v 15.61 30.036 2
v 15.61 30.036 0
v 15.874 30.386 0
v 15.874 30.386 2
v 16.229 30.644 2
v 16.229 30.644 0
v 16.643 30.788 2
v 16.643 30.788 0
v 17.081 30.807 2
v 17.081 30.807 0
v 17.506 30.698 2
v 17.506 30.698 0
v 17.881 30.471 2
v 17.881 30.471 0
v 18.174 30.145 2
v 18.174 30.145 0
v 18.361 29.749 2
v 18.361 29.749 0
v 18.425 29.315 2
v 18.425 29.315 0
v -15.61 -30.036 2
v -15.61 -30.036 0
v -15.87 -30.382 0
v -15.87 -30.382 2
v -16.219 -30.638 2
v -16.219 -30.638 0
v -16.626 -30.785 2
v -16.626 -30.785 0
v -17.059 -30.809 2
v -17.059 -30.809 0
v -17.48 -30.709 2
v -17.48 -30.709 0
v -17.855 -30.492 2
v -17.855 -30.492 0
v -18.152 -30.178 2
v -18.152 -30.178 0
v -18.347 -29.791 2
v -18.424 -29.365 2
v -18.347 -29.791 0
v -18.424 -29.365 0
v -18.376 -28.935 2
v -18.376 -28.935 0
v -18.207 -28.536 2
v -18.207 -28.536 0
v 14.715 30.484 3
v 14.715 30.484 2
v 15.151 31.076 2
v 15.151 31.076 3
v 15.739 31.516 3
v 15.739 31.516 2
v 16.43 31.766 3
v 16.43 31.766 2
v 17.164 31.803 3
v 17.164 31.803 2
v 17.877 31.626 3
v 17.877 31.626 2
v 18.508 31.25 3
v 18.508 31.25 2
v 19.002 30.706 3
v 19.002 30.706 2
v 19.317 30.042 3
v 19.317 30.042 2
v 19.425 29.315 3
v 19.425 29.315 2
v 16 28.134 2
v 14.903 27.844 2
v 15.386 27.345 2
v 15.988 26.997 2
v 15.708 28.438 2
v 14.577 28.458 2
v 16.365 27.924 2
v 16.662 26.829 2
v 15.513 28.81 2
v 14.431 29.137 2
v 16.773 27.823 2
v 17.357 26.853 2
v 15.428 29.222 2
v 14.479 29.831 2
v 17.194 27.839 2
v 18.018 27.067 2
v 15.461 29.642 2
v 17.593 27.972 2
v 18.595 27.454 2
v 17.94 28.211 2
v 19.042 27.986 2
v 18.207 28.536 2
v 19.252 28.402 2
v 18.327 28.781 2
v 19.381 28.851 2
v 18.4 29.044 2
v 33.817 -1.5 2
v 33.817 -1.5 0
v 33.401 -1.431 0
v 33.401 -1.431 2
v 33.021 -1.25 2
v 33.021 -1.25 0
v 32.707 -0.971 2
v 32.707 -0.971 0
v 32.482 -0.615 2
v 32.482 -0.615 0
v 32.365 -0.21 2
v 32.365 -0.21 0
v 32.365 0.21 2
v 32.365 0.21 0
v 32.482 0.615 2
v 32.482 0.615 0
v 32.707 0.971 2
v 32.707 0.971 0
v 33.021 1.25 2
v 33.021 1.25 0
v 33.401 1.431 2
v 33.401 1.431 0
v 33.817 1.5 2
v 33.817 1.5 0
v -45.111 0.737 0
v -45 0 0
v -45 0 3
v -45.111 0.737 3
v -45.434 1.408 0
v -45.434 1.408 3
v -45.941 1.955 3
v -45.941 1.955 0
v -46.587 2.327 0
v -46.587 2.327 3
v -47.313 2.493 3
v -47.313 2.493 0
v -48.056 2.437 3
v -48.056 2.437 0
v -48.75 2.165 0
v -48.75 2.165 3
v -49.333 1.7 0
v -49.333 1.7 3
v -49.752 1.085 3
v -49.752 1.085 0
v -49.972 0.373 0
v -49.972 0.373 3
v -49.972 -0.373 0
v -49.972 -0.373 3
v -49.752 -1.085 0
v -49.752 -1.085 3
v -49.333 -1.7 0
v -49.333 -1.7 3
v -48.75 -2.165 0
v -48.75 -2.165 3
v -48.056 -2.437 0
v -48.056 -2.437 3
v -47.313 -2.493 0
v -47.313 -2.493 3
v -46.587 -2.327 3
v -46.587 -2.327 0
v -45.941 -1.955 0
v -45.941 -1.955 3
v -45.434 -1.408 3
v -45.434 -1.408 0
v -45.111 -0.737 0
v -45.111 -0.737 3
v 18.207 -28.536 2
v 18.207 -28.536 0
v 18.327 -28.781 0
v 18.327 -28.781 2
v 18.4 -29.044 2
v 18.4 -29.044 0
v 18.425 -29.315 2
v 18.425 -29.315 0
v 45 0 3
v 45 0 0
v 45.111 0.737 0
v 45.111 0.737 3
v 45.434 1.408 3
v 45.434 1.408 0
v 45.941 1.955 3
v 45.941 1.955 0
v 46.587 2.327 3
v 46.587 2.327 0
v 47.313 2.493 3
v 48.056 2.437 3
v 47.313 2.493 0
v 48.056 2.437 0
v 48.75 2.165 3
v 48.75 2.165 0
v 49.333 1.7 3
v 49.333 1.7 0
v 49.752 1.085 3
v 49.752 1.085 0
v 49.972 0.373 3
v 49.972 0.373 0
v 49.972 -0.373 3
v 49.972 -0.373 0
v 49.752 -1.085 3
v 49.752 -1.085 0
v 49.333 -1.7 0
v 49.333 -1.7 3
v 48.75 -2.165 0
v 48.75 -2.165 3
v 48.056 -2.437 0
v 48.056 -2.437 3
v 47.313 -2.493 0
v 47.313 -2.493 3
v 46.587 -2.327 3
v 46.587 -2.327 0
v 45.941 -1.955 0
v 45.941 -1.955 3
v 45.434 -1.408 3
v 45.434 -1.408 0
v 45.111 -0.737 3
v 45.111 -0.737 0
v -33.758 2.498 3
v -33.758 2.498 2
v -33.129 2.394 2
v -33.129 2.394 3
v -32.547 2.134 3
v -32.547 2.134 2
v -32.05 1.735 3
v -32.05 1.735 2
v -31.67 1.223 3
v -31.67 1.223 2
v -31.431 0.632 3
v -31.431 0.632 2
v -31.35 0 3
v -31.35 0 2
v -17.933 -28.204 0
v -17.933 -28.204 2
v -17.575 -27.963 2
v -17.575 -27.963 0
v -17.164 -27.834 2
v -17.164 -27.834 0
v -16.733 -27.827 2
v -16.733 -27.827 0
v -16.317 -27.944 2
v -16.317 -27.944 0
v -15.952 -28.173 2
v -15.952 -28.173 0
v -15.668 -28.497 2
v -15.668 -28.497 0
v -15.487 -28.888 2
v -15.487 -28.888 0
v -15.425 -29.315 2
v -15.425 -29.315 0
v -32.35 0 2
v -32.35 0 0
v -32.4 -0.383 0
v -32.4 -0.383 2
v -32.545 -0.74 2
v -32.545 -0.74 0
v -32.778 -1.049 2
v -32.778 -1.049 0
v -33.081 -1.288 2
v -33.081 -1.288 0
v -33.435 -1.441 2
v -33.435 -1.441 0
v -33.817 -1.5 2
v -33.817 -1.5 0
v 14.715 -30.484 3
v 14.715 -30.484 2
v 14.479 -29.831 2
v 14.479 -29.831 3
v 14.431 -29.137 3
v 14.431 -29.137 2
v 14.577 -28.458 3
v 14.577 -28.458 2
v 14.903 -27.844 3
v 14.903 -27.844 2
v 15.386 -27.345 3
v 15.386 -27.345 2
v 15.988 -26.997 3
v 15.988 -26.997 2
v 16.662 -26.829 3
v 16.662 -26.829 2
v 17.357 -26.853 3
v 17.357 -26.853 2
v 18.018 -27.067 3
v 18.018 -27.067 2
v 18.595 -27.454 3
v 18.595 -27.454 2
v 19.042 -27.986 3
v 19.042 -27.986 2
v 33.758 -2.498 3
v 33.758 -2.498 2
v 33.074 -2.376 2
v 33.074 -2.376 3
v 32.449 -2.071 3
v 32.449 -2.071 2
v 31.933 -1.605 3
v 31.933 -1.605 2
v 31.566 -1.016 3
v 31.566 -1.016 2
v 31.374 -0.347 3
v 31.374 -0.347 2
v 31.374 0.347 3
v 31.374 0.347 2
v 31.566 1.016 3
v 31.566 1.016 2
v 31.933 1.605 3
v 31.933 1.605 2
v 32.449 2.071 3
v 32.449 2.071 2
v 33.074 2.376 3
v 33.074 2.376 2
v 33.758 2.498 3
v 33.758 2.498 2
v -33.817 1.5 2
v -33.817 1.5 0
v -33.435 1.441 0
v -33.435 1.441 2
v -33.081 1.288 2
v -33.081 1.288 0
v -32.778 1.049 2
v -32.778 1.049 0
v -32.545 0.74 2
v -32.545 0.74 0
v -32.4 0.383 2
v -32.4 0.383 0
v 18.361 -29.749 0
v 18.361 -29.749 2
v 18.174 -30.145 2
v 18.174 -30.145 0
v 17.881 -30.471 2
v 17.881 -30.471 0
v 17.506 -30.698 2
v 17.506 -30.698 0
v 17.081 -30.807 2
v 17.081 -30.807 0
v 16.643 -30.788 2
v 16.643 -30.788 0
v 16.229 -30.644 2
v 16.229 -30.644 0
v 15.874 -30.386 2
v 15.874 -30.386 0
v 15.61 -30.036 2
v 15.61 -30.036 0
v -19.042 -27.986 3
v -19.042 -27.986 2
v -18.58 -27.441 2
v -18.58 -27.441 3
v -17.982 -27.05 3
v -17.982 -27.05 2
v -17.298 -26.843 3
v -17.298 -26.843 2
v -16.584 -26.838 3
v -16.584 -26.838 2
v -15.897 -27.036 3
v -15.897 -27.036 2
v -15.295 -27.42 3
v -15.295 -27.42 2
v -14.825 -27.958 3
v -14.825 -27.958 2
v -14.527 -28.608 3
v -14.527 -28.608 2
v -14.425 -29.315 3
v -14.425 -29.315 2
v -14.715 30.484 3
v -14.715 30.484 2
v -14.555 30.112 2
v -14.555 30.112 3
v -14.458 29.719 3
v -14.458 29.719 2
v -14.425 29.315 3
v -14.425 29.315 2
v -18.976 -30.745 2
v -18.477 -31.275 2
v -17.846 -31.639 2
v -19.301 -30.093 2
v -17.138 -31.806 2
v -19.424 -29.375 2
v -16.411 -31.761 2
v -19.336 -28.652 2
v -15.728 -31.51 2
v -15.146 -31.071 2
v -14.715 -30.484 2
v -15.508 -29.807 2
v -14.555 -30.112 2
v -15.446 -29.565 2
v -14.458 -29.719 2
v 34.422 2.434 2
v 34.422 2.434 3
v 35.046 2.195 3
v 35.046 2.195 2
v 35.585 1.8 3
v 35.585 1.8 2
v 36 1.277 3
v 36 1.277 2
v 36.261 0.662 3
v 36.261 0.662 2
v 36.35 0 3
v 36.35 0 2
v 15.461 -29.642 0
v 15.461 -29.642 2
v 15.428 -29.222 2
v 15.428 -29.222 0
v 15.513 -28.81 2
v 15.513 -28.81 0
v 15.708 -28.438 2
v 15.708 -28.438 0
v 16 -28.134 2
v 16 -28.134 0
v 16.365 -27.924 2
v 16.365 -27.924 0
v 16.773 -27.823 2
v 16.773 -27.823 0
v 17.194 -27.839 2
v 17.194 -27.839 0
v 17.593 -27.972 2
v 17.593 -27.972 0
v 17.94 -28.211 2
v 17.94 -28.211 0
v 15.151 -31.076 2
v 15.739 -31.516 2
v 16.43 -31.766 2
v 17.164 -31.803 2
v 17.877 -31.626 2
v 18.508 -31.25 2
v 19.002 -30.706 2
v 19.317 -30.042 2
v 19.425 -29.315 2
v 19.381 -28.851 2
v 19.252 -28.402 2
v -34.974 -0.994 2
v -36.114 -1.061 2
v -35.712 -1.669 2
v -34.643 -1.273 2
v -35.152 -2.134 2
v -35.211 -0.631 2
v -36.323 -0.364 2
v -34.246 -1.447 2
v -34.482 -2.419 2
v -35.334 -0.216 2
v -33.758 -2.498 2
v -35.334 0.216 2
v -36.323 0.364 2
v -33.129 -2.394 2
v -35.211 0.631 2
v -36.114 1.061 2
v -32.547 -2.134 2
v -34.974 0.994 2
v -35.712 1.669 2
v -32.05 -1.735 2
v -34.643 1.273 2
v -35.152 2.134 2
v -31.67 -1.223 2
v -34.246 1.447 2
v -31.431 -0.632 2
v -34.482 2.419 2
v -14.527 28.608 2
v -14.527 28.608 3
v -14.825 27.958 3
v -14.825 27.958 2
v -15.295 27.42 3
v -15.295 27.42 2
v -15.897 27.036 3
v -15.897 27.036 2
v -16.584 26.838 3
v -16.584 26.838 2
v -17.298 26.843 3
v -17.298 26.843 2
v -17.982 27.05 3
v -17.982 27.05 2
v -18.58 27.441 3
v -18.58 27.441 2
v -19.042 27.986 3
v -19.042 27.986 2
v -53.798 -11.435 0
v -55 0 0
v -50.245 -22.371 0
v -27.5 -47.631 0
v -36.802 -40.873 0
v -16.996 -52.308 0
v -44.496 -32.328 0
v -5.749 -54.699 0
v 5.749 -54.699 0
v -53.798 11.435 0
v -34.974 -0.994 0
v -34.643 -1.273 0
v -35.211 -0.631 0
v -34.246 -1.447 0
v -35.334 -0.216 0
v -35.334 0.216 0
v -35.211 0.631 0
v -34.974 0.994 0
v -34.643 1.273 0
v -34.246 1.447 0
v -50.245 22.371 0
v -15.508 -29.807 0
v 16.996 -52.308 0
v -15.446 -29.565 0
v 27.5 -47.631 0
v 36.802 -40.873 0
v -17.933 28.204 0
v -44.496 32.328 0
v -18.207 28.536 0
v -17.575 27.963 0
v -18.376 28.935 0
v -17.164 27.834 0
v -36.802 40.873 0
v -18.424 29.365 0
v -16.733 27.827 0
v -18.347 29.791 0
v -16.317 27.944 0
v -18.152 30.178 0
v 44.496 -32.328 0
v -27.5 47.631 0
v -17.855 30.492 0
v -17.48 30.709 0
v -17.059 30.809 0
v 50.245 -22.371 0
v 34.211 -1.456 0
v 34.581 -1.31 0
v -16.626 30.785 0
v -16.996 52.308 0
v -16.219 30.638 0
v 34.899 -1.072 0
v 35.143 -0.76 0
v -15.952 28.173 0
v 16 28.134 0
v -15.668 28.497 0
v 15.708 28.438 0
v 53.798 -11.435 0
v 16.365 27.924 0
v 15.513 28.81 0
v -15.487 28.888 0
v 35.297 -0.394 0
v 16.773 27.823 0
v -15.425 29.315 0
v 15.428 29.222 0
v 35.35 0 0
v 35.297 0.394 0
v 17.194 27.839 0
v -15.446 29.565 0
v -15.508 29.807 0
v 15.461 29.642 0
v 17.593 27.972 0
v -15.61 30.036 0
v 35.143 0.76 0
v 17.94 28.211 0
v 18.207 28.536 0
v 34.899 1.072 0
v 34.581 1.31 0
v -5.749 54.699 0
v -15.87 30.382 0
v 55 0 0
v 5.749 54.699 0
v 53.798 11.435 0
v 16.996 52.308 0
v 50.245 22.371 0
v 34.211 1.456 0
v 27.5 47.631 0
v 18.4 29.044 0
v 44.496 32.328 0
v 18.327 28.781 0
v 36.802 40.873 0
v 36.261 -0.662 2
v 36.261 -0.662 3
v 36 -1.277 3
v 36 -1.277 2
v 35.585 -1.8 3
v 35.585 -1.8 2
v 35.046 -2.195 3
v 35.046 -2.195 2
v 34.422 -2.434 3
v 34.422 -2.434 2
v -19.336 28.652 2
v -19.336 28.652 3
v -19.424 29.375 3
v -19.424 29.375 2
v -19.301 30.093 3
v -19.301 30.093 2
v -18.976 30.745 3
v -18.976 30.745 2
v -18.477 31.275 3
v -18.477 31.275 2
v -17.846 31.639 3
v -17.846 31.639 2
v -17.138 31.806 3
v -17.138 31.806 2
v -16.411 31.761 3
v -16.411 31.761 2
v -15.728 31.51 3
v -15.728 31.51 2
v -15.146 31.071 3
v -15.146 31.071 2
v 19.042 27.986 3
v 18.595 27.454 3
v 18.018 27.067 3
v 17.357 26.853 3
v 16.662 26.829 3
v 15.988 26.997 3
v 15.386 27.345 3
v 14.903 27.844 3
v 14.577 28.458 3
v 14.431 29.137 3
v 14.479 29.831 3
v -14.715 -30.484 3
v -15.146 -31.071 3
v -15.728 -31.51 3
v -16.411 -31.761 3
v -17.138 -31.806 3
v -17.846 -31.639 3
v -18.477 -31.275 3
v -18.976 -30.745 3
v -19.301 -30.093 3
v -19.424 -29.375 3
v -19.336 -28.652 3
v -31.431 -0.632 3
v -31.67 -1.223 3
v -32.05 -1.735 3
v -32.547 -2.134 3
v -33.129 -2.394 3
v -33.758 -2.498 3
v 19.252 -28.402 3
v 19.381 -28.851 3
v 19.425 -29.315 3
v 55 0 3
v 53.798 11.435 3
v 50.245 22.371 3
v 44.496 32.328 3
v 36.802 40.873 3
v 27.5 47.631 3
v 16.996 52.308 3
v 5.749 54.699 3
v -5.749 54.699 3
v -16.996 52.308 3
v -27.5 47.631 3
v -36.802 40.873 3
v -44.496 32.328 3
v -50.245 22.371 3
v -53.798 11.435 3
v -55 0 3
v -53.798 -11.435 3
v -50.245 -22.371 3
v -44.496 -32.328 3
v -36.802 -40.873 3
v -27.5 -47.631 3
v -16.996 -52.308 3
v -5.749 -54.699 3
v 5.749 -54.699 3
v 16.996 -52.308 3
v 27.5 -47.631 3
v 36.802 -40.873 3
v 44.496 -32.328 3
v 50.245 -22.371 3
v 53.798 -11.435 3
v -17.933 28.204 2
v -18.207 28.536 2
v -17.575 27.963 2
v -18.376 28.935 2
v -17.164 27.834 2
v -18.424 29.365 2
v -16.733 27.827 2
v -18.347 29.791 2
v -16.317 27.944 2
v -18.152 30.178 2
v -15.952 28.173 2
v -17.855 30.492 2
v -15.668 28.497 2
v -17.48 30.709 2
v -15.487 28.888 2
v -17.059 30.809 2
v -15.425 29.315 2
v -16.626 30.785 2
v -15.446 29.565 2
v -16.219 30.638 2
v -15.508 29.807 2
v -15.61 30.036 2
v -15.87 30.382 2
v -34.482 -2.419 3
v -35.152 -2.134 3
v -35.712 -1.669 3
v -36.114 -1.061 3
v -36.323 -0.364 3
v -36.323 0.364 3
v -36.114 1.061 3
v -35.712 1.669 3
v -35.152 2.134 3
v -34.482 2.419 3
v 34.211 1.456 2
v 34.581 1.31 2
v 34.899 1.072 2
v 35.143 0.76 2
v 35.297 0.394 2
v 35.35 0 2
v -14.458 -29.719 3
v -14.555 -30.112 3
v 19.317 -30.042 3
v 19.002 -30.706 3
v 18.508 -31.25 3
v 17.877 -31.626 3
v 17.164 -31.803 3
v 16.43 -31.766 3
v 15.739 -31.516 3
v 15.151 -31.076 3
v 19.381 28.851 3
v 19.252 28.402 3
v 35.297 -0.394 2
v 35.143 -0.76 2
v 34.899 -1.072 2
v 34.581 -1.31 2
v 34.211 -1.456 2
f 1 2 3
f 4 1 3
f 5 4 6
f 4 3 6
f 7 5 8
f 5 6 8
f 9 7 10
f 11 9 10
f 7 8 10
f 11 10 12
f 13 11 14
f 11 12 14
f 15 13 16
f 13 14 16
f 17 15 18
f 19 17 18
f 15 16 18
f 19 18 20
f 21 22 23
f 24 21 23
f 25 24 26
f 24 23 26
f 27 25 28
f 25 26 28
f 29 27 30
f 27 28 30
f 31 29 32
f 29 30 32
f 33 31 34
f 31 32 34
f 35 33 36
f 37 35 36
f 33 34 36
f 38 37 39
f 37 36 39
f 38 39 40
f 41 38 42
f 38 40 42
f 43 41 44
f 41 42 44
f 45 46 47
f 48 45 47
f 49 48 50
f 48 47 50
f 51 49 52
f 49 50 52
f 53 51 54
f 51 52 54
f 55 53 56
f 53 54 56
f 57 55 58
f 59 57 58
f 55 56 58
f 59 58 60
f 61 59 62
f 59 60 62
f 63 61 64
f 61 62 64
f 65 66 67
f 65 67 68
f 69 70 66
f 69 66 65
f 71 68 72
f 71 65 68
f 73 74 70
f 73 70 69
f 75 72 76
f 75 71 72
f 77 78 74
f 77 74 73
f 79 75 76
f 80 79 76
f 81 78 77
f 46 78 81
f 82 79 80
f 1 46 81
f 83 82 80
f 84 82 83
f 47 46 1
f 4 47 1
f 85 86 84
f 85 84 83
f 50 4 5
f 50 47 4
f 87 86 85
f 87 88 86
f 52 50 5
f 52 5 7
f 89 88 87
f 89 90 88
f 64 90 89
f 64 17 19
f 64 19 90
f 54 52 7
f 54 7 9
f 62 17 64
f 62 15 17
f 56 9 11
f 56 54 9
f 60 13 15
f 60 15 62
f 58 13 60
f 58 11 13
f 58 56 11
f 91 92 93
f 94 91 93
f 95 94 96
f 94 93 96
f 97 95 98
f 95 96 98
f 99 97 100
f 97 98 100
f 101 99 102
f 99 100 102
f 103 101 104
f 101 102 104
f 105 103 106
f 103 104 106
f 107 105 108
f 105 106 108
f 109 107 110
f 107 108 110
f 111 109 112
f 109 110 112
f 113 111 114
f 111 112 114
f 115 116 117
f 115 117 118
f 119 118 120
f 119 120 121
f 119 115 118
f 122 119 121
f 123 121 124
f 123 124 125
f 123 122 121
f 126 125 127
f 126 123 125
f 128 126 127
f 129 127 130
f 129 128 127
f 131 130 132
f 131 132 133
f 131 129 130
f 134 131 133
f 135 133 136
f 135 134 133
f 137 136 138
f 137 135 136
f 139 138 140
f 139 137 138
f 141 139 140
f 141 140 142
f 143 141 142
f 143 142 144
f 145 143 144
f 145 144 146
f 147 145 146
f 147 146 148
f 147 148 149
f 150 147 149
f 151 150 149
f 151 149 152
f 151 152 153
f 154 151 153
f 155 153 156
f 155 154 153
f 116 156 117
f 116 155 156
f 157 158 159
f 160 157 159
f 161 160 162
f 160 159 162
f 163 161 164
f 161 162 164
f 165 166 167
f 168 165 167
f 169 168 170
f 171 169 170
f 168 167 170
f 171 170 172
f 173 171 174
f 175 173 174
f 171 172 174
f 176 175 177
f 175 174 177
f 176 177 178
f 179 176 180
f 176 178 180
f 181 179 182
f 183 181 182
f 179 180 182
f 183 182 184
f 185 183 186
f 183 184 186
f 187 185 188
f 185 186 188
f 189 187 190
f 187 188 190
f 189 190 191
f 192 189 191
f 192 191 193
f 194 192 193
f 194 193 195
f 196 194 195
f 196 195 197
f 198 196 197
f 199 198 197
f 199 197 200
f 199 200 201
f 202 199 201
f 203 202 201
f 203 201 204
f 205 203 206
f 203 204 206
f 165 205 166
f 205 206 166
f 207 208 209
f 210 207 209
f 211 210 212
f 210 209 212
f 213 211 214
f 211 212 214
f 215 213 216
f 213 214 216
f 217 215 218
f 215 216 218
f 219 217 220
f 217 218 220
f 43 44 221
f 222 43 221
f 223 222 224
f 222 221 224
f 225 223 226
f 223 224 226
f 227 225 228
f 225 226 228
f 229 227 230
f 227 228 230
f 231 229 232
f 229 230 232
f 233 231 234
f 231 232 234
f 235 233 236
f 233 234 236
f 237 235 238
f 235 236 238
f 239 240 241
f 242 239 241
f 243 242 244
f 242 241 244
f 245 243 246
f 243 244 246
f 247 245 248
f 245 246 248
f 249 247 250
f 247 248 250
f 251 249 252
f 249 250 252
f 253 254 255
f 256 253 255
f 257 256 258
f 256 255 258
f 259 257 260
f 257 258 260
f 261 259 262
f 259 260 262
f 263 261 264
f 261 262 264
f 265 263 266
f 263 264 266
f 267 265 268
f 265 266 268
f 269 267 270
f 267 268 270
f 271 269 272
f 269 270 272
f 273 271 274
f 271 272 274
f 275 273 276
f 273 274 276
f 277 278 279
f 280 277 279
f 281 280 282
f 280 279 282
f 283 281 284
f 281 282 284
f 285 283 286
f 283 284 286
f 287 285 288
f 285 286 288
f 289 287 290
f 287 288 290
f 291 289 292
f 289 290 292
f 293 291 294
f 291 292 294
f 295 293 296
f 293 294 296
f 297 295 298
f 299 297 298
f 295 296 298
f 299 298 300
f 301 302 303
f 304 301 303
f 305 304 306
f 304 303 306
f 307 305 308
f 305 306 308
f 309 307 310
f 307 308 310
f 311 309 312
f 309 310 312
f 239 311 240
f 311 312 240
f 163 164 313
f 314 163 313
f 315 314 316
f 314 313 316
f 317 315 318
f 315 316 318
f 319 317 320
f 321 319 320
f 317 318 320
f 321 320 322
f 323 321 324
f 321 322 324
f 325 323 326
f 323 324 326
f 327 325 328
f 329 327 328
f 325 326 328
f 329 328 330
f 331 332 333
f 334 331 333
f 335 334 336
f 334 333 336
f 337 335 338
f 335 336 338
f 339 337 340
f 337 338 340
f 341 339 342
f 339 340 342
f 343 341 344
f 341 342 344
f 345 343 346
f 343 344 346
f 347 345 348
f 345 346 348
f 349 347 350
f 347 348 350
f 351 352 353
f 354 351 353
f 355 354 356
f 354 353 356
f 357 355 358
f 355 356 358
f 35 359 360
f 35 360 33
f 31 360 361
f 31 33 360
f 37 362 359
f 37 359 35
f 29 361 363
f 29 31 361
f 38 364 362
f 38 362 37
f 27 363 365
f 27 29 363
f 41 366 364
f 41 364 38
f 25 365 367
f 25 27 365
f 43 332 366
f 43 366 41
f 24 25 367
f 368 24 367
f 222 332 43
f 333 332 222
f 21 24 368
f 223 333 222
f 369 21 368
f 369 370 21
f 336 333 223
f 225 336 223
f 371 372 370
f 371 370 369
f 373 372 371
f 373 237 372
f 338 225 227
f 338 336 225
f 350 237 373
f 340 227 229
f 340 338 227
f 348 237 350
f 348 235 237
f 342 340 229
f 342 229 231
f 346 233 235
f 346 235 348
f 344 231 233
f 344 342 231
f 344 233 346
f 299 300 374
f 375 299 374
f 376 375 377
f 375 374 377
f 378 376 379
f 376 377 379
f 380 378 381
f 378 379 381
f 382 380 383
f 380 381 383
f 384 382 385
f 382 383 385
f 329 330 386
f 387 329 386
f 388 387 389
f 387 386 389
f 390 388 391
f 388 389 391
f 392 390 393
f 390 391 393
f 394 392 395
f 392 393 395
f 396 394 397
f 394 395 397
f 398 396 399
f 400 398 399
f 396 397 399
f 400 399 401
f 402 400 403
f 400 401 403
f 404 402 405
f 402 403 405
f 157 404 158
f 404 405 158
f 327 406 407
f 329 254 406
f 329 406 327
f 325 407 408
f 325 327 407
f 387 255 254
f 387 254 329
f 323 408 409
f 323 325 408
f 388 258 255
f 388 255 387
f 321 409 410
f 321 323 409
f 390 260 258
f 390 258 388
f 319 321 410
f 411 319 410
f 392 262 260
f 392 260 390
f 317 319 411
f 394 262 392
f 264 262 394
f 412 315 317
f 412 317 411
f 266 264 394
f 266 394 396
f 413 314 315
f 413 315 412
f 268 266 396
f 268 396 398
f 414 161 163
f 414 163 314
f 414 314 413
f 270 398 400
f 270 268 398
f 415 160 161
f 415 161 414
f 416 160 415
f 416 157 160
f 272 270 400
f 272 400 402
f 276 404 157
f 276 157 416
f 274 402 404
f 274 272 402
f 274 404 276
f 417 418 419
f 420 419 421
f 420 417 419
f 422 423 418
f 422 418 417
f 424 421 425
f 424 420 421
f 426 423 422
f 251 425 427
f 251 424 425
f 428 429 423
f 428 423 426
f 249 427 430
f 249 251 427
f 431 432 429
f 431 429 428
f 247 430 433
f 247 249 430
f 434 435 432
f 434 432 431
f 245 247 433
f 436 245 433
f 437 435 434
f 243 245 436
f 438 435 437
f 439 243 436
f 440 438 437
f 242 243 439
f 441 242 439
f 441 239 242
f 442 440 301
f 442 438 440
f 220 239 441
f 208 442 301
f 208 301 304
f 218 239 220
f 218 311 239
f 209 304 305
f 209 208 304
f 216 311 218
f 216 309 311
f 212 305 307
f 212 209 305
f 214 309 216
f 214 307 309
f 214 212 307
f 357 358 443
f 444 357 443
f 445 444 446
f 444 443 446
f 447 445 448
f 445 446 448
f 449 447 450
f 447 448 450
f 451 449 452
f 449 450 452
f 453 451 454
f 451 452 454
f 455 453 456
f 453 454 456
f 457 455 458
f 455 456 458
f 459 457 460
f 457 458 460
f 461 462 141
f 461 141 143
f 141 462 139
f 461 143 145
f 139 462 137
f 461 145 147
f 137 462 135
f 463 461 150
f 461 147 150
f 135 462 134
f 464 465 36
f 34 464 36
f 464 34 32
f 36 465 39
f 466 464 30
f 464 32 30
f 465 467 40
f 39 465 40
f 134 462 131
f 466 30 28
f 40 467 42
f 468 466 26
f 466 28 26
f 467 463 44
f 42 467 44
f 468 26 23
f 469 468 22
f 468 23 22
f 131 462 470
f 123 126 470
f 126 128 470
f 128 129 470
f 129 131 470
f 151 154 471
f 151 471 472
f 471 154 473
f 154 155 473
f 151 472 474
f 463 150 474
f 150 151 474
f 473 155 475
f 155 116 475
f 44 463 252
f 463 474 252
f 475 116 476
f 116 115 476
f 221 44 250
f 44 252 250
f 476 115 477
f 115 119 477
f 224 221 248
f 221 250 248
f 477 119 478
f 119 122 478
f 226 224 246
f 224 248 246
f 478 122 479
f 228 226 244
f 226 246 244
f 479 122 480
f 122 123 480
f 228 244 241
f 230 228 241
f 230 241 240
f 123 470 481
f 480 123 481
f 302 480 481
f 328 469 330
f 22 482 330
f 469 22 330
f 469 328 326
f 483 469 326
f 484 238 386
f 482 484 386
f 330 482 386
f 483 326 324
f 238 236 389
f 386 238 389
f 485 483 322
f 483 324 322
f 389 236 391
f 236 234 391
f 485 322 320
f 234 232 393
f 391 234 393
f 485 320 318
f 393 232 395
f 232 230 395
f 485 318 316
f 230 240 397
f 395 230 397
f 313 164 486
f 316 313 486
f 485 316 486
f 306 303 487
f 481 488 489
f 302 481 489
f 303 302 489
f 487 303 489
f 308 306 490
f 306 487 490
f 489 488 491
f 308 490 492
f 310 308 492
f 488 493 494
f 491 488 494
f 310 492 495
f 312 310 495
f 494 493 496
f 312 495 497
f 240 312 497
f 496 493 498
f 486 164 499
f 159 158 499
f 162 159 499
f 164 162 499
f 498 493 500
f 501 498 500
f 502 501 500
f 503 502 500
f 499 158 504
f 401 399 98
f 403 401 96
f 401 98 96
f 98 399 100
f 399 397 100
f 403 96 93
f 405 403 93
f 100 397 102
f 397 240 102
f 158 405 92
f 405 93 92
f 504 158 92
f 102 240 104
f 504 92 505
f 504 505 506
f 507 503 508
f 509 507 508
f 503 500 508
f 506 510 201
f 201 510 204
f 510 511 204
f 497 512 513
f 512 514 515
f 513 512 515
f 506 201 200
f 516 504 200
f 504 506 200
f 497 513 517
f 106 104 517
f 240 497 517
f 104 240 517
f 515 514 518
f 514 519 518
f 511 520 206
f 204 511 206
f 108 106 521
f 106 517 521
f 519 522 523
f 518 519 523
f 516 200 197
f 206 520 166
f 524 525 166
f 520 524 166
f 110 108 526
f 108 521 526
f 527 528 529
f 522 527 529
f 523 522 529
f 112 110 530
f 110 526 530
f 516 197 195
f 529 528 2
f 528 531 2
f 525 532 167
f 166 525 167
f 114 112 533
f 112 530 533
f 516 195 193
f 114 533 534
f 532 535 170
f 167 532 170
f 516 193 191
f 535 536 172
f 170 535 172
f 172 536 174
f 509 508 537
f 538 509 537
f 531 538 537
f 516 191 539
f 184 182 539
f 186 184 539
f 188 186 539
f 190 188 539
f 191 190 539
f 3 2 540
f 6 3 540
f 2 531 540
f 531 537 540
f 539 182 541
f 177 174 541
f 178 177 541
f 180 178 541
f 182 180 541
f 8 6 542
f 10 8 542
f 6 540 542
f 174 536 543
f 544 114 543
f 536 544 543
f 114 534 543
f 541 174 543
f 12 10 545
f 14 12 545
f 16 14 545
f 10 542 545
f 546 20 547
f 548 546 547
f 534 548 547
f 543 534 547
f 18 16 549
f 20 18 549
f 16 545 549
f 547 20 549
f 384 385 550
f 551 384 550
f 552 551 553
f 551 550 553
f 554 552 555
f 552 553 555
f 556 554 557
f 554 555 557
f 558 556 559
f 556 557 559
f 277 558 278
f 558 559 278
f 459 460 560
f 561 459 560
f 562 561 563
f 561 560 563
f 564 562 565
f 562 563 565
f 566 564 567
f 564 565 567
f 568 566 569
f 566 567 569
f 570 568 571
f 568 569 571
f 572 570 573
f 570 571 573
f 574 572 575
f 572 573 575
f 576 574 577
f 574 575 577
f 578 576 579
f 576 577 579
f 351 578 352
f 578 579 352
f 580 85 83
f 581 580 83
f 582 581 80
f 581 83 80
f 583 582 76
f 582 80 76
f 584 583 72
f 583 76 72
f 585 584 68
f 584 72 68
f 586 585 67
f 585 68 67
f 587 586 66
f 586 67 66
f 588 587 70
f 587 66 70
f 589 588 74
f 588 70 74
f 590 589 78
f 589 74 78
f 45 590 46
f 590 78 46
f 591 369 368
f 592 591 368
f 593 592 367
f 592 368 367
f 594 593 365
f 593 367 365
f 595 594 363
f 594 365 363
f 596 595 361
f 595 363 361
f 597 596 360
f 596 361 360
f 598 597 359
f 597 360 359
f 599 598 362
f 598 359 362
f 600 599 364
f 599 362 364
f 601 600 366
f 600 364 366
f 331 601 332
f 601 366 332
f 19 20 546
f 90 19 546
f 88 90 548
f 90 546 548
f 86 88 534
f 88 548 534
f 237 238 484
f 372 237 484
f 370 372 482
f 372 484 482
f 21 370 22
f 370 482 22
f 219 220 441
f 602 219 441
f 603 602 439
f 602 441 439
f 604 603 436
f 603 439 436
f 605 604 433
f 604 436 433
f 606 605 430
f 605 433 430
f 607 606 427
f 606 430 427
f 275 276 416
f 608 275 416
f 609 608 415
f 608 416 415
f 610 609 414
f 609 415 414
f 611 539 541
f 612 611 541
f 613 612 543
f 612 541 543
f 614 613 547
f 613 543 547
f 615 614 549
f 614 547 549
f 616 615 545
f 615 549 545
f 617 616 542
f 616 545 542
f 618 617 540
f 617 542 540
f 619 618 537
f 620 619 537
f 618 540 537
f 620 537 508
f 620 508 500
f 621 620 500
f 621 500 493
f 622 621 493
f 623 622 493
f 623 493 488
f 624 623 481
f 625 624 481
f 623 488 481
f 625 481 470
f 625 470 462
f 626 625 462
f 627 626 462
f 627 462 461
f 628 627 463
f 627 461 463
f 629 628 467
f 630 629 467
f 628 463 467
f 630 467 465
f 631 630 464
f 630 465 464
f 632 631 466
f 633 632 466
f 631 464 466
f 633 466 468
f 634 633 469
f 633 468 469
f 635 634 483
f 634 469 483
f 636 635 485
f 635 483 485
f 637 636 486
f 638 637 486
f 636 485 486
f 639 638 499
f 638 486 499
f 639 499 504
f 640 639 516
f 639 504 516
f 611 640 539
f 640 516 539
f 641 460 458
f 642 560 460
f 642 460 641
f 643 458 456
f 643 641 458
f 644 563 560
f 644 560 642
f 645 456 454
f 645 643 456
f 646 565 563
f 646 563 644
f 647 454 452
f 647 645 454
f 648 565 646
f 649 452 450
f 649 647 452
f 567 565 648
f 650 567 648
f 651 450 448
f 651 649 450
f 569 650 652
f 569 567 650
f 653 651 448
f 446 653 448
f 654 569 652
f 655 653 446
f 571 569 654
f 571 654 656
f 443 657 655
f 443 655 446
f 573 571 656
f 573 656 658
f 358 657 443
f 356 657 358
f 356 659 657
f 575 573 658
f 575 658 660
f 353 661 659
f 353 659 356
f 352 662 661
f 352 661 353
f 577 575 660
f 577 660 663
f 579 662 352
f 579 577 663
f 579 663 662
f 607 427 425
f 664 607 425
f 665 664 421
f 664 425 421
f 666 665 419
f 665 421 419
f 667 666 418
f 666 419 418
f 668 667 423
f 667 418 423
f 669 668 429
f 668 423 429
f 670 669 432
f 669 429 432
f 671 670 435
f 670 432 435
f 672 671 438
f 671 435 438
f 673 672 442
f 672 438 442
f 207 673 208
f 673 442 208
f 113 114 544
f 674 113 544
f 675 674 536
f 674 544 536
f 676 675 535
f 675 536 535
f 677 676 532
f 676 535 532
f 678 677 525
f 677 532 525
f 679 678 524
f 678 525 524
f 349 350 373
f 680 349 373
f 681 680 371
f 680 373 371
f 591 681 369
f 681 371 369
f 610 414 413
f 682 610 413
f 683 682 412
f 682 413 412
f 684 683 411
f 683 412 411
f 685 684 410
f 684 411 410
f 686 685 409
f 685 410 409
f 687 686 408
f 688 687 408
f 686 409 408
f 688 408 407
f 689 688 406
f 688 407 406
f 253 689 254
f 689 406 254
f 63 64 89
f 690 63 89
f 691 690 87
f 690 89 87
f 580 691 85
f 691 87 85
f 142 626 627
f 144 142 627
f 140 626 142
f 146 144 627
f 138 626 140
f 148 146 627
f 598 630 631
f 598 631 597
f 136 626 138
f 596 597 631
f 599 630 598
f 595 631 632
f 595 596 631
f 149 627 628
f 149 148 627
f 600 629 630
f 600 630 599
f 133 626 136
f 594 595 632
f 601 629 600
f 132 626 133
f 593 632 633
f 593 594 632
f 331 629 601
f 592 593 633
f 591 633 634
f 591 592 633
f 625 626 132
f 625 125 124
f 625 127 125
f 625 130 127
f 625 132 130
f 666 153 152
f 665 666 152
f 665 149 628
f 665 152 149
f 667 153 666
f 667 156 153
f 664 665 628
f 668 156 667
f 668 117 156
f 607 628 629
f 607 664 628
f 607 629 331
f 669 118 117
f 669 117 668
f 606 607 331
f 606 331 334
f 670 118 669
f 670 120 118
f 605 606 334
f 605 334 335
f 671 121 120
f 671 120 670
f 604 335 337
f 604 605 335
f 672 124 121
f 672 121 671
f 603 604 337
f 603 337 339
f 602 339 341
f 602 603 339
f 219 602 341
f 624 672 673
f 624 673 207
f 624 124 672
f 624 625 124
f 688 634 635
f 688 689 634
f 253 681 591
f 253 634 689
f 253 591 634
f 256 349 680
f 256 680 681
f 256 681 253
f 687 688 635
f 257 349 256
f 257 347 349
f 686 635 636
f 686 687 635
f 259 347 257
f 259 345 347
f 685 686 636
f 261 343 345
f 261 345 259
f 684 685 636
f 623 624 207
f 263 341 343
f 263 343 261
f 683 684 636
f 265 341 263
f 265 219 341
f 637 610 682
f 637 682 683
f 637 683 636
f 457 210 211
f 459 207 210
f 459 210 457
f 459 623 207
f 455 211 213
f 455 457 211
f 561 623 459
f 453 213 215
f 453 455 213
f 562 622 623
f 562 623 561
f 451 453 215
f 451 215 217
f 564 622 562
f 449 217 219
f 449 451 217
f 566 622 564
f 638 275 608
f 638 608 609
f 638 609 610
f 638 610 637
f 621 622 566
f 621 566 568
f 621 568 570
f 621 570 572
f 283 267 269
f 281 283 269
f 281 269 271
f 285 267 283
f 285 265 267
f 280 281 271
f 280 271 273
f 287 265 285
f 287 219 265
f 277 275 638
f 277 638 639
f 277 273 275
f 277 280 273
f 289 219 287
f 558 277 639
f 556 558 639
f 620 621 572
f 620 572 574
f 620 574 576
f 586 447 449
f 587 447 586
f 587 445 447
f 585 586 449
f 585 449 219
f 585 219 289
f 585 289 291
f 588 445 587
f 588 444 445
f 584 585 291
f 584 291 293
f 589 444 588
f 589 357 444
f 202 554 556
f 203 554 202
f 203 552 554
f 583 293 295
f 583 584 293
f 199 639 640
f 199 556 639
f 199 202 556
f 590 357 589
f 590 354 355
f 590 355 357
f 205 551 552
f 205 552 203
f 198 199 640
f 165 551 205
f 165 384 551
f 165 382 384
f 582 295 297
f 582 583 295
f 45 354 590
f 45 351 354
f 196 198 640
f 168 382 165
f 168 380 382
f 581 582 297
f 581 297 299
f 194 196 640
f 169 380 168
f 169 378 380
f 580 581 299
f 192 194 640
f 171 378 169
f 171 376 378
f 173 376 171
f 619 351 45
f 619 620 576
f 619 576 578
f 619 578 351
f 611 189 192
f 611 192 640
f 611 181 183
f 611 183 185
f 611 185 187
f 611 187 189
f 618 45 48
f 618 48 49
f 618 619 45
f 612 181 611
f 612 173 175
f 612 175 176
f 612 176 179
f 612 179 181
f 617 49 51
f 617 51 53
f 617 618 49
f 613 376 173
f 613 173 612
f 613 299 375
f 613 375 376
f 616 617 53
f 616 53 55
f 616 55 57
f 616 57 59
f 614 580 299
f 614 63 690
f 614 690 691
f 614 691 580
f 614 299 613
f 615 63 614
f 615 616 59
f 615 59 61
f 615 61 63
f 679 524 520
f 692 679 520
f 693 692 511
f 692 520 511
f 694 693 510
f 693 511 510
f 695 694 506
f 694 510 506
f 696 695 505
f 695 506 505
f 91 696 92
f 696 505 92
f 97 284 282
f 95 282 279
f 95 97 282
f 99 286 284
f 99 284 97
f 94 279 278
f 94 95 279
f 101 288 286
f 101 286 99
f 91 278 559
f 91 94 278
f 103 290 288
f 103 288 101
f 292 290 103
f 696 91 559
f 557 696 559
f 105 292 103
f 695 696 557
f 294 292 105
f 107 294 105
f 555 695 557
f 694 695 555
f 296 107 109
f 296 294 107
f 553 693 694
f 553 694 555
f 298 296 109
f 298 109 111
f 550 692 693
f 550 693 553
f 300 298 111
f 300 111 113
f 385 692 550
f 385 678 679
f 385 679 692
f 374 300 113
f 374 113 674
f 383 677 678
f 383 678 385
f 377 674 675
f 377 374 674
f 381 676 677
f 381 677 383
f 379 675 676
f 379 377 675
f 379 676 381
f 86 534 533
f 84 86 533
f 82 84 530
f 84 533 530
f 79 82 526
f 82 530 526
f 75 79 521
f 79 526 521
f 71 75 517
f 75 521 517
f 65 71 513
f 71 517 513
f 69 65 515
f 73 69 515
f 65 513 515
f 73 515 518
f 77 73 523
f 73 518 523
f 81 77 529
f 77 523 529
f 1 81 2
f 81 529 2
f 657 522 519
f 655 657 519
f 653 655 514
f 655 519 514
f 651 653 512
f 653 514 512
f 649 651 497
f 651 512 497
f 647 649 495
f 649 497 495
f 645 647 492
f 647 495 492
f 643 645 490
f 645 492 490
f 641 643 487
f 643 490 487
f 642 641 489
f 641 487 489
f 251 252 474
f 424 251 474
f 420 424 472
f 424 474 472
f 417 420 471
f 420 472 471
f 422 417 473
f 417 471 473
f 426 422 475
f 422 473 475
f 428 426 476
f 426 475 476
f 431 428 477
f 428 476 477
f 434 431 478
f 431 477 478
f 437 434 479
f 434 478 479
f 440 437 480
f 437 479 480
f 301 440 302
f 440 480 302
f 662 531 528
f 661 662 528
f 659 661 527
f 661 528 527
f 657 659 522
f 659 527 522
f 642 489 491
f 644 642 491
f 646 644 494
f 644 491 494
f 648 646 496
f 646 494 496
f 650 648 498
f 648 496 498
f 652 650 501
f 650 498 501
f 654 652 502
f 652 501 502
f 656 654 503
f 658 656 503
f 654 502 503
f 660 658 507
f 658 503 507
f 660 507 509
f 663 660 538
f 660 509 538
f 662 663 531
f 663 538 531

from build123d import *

# Parameters (mm, degrees)
F0_R     = 55
F0_R_2   = 2.5
F0_R_3   = 40
F1_DEPTH = 3
F2_DEPTH = 2


with BuildPart() as f1:
    # F0 (on Top) → F1 (new body)
    with BuildSketch(Plane.XY):
        Circle(F0_R)
        with Locations((-47.5, 0)):
            Circle(F0_R_2, mode=Mode.SUBTRACT)
        Circle(F0_R_3, mode=Mode.SUBTRACT)
        with BuildLine():
            ThreePointArc((50, 0), (47.5, -2.5), (45, 0))
            ThreePointArc((45, 0), (47.5, 2.5), (50, 0))
        make_face(mode=Mode.SUBTRACT)
        Circle(F0_R_3)
        with BuildLine():
            ThreePointArc((19.0424272849, 27.9858618431), (29.3149599181, 16.925), (33.7576809453, 2.4982948569))
            ThreePointArc((33.7576809453, 2.4982948569), (35.584820216, 1.8001107795), (36.35, 0))
            ThreePointArc((36.35, 0), (35.584820216, -1.8001107795), (33.7576809453, -2.4982948569))
            ThreePointArc((33.7576809453, -2.4982948569), (29.3149599181, -16.925), (19.0424272849, -27.9858618431))
            ThreePointArc((19.0424272849, -27.9858618431), (19.3274537677, -28.6234283614), (19.425, -29.3149599181))
            ThreePointArc((19.425, -29.3149599181), (17.5273429883, -31.7413116907), (14.7152536604, -30.4841567))
            ThreePointArc((14.7152536604, -30.4841567), (0, -33.85), (-14.7152536604, -30.4841567))
            ThreePointArc((-14.7152536604, -30.4841567), (-18.175, -31.4800234276), (-19.0424272849, -27.9858618431))
            ThreePointArc((-19.0424272849, -27.9858618431), (-29.3149599181, -16.925), (-33.7576809453, -2.4982948569))
            ThreePointArc((-33.7576809453, -2.4982948569), (-36.35, 0), (-33.7576809453, 2.4982948569))
            ThreePointArc((-33.7576809453, 2.4982948569), (-29.3149599181, 16.925), (-19.0424272849, 27.9858618431))
            ThreePointArc((-19.0424272849, 27.9858618431), (-18.175, 31.4800234276), (-14.7152536604, 30.4841567))
            ThreePointArc((-14.7152536604, 30.4841567), (0, 33.85), (14.7152536604, 30.4841567))
            ThreePointArc((14.7152536604, 30.4841567), (17.5273429883, 31.7413116907), (19.425, 29.3149599181))
            ThreePointArc((19.425, 29.3149599181), (19.3274537677, 28.6234283614), (19.0424272849, 27.9858618431))
        make_face(mode=Mode.SUBTRACT)
        with BuildLine():
            ThreePointArc((33.7576809453, -2.4982948569), (31.35, 0), (33.7576809453, 2.4982948569))
            ThreePointArc((33.7576809453, 2.4982948569), (29.3149599181, 16.925), (19.0424272849, 27.9858618431))
            ThreePointArc((19.0424272849, 27.9858618431), (15.675, 27.1498964086), (14.7152536604, 30.4841567))
            ThreePointArc((14.7152536604, 30.4841567), (0, 33.85), (-14.7152536604, 30.4841567))
            ThreePointArc((-14.7152536604, 30.4841567), (-14.4986482274, 29.9173029064), (-14.425, 29.3149599181))
            ThreePointArc((-14.425, 29.3149599181), (-16.2334684433, 26.9125061504), (-19.0424272849, 27.9858618431))
            ThreePointArc((-19.0424272849, 27.9858618431), (-29.3149599181, 16.925), (-33.7576809453, 2.4982948569))
            ThreePointArc((-33.7576809453, 2.4982948569), (-32.0498892205, 1.734820216), (-31.35, 0))
            ThreePointArc((-31.35, 0), (-32.0498892205, -1.734820216), (-33.7576809453, -2.4982948569))
            ThreePointArc((-33.7576809453, -2.4982948569), (-29.3149599181, -16.925), (-19.0424272849, -27.9858618431))
            ThreePointArc((-19.0424272849, -27.9858618431), (-16.2334684433, -26.9125061504), (-14.425, -29.3149599181))
            ThreePointArc((-14.425, -29.3149599181), (-14.4986482274, -29.9173029064), (-14.7152536604, -30.4841567))
            ThreePointArc((-14.7152536604, -30.4841567), (0, -33.85), (14.7152536604, -30.4841567))
            ThreePointArc((14.7152536604, -30.4841567), (15.675, -27.1498964086), (19.0424272849, -27.9858618431))
            ThreePointArc((19.0424272849, -27.9858618431), (29.3149599181, -16.925), (33.7576809453, -2.4982948569))
        make_face()
    extrude(amount=F1_DEPTH)

    # F0 (on Top) → F2 (join)
    with BuildSketch(Plane.XY):
        with BuildLine():
            ThreePointArc((-14.425, 29.3149599181), (-14.4986482274, 29.9173029064), (-14.7152536604, 30.4841567))
            ThreePointArc((-14.7152536604, 30.4841567), (-15.1641142387, 30.2633795098), (-15.6096633615, 30.0359935701))
            ThreePointArc((-15.6096633615, 30.0359935701), (-15.4718990128, 29.6871124689), (-15.425, 29.3149599181))
            ThreePointArc((-15.425, 29.3149599181), (-16.5207430695, 27.8704612735), (-18.2071017789, 28.5363618006))
            ThreePointArc((-18.2071017789, 28.5363618006), (-18.6267983405, 28.2641979115), (-19.0424272849, 27.9858618431))
            ThreePointArc((-19.0424272849, 27.9858618431), (-16.2334684433, 26.9125061504), (-14.425, 29.3149599181))
        make_face()
        with BuildLine():
            ThreePointArc((-15.6096633615, 30.0359935701), (-15.1641142387, 30.2633795098), (-14.7152536604, 30.4841567))
            ThreePointArc((-14.7152536604, 30.4841567), (-18.175, 31.4800234276), (-19.0424272849, 27.9858618431))
            ThreePointArc((-19.0424272849, 27.9858618431), (-18.6267983405, 28.2641979115), (-18.2071017789, 28.5363618006))
            ThreePointArc((-18.2071017789, 28.5363618006), (-17.675, 30.6139980238), (-15.6096633615, 30.0359935701))
        make_face()
        with BuildLine():
            ThreePointArc((-31.35, 0), (-32.0498892205, 1.734820216), (-33.7576809453, 2.4982948569))
            ThreePointArc((-33.7576809453, 2.4982948569), (-33.7909125792, 1.9991815983), (-33.8167651403, 1.4996317695))
            ThreePointArc((-33.8167651403, 1.4996317695), (-32.7776539063, 1.0488440567), (-32.35, 0))
            ThreePointArc((-32.35, 0), (-32.7776539063, -1.0488440567), (-33.8167651403, -1.4996317695))
            ThreePointArc((-33.8167651403, -1.4996317695), (-33.7909125792, -1.9991815983), (-33.7576809453, -2.4982948569))
            ThreePointArc((-33.7576809453, -2.4982948569), (-32.0498892205, -1.734820216), (-31.35, 0))
        make_face()
        with BuildLine():
            ThreePointArc((-33.8167651403, 1.4996317695), (-33.7909125792, 1.9991815983), (-33.7576809453, 2.4982948569))
            ThreePointArc((-33.7576809453, 2.4982948569), (-36.35, 0), (-33.7576809453, -2.4982948569))
            ThreePointArc((-33.7576809453, -2.4982948569), (-33.7909125792, -1.9991815983), (-33.8167651403, -1.4996317695))
            ThreePointArc((-33.8167651403, -1.4996317695), (-35.35, 0), (-33.8167651403, 1.4996317695))
        make_face()
        with BuildLine():
            ThreePointArc((-15.6096633615, -30.0359935701), (-15.1641142387, -30.2633795098), (-14.7152536604, -30.4841567))
            ThreePointArc((-14.7152536604, -30.4841567), (-14.4986482274, -29.9173029064), (-14.425, -29.3149599181))
            ThreePointArc((-14.425, -29.3149599181), (-16.2334684433, -26.9125061504), (-19.0424272849, -27.9858618431))
            ThreePointArc((-19.0424272849, -27.9858618431), (-18.6267983405, -28.2641979115), (-18.2071017789, -28.5363618006))
            ThreePointArc((-18.2071017789, -28.5363618006), (-16.5207430695, -27.8704612735), (-15.425, -29.3149599181))
            ThreePointArc((-15.425, -29.3149599181), (-15.4718990128, -29.6871124689), (-15.6096633615, -30.0359935701))
        make_face()
        with BuildLine():
            ThreePointArc((-19.0424272849, -27.9858618431), (-18.175, -31.4800234276), (-14.7152536604, -30.4841567))
            ThreePointArc((-14.7152536604, -30.4841567), (-15.1641142387, -30.2633795098), (-15.6096633615, -30.0359935701))
            ThreePointArc((-15.6096633615, -30.0359935701), (-17.675, -30.6139980238), (-18.2071017789, -28.5363618006))
            ThreePointArc((-18.2071017789, -28.5363618006), (-18.6267983405, -28.2641979115), (-19.0424272849, -27.9858618431))
        make_face()
        with BuildLine():
            ThreePointArc((18.2071017789, -28.5363618006), (18.6267983405, -28.2641979115), (19.0424272849, -27.9858618431))
            ThreePointArc((19.0424272849, -27.9858618431), (15.675, -27.1498964086), (14.7152536604, -30.4841567))
            ThreePointArc((14.7152536604, -30.4841567), (15.1641142387, -30.2633795098), (15.6096633615, -30.0359935701))
            ThreePointArc((15.6096633615, -30.0359935701), (16.175, -28.0159218124), (18.2071017789, -28.5363618006))
        make_face()
        with BuildLine():
            ThreePointArc((19.425, -29.3149599181), (19.3274537677, -28.6234283614), (19.0424272849, -27.9858618431))
            ThreePointArc((19.0424272849, -27.9858618431), (18.6267983405, -28.2641979115), (18.2071017789, -28.5363618006))
            ThreePointArc((18.2071017789, -28.5363618006), (18.3694986446, -28.9107029876), (18.425, -29.3149599181))
            ThreePointArc((18.425, -29.3149599181), (17.2971525508, -30.7680609053), (15.6096633615, -30.0359935701))
            ThreePointArc((15.6096633615, -30.0359935701), (15.1641142387, -30.2633795098), (14.7152536604, -30.4841567))
            ThreePointArc((14.7152536604, -30.4841567), (17.5273429883, -31.7413116907), (19.425, -29.3149599181))
        make_face()
        with BuildLine():
            ThreePointArc((33.7576809453, 2.4982948569), (33.7909125792, 1.9991815983), (33.8167651403, 1.4996317695))
            ThreePointArc((33.8167651403, 1.4996317695), (34.8988440567, 1.0723460937), (35.35, 0))
            ThreePointArc((35.35, 0), (34.8988440567, -1.0723460937), (33.8167651403, -1.4996317695))
            ThreePointArc((33.8167651403, -1.4996317695), (33.7909125792, -1.9991815983), (33.7576809453, -2.4982948569))
            ThreePointArc((33.7576809453, -2.4982948569), (35.584820216, -1.8001107795), (36.35, 0))
            ThreePointArc((36.35, 0), (35.584820216, 1.8001107795), (33.7576809453, 2.4982948569))
        make_face()
        with BuildLine():
            ThreePointArc((33.8167651403, -1.4996317695), (32.35, 0), (33.8167651403, 1.4996317695))
            ThreePointArc((33.8167651403, 1.4996317695), (33.7909125792, 1.9991815983), (33.7576809453, 2.4982948569))
            ThreePointArc((33.7576809453, 2.4982948569), (31.35, 0), (33.7576809453, -2.4982948569))
            ThreePointArc((33.7576809453, -2.4982948569), (33.7909125792, -1.9991815983), (33.8167651403, -1.4996317695))
        make_face()
        with BuildLine():
            ThreePointArc((18.2071017789, 28.5363618006), (18.6267983405, 28.2641979115), (19.0424272849, 27.9858618431))
            ThreePointArc((19.0424272849, 27.9858618431), (19.3274537677, 28.6234283614), (19.425, 29.3149599181))
            ThreePointArc((19.425, 29.3149599181), (17.5273429883, 31.7413116907), (14.7152536604, 30.4841567))
            ThreePointArc((14.7152536604, 30.4841567), (15.1641142387, 30.2633795098), (15.6096633615, 30.0359935701))
            ThreePointArc((15.6096633615, 30.0359935701), (17.2971525508, 30.7680609053), (18.425, 29.3149599181))
            ThreePointArc((18.425, 29.3149599181), (18.3694986446, 28.9107029876), (18.2071017789, 28.5363618006))
        make_face()
        with BuildLine():
            ThreePointArc((14.7152536604, 30.4841567), (15.675, 27.1498964086), (19.0424272849, 27.9858618431))
            ThreePointArc((19.0424272849, 27.9858618431), (18.6267983405, 28.2641979115), (18.2071017789, 28.5363618006))
            ThreePointArc((18.2071017789, 28.5363618006), (16.175, 28.0159218124), (15.6096633615, 30.0359935701))
            ThreePointArc((15.6096633615, 30.0359935701), (15.1641142387, 30.2633795098), (14.7152536604, 30.4841567))
        make_face()
    extrude(amount=F2_DEPTH)


solid = f1.part
